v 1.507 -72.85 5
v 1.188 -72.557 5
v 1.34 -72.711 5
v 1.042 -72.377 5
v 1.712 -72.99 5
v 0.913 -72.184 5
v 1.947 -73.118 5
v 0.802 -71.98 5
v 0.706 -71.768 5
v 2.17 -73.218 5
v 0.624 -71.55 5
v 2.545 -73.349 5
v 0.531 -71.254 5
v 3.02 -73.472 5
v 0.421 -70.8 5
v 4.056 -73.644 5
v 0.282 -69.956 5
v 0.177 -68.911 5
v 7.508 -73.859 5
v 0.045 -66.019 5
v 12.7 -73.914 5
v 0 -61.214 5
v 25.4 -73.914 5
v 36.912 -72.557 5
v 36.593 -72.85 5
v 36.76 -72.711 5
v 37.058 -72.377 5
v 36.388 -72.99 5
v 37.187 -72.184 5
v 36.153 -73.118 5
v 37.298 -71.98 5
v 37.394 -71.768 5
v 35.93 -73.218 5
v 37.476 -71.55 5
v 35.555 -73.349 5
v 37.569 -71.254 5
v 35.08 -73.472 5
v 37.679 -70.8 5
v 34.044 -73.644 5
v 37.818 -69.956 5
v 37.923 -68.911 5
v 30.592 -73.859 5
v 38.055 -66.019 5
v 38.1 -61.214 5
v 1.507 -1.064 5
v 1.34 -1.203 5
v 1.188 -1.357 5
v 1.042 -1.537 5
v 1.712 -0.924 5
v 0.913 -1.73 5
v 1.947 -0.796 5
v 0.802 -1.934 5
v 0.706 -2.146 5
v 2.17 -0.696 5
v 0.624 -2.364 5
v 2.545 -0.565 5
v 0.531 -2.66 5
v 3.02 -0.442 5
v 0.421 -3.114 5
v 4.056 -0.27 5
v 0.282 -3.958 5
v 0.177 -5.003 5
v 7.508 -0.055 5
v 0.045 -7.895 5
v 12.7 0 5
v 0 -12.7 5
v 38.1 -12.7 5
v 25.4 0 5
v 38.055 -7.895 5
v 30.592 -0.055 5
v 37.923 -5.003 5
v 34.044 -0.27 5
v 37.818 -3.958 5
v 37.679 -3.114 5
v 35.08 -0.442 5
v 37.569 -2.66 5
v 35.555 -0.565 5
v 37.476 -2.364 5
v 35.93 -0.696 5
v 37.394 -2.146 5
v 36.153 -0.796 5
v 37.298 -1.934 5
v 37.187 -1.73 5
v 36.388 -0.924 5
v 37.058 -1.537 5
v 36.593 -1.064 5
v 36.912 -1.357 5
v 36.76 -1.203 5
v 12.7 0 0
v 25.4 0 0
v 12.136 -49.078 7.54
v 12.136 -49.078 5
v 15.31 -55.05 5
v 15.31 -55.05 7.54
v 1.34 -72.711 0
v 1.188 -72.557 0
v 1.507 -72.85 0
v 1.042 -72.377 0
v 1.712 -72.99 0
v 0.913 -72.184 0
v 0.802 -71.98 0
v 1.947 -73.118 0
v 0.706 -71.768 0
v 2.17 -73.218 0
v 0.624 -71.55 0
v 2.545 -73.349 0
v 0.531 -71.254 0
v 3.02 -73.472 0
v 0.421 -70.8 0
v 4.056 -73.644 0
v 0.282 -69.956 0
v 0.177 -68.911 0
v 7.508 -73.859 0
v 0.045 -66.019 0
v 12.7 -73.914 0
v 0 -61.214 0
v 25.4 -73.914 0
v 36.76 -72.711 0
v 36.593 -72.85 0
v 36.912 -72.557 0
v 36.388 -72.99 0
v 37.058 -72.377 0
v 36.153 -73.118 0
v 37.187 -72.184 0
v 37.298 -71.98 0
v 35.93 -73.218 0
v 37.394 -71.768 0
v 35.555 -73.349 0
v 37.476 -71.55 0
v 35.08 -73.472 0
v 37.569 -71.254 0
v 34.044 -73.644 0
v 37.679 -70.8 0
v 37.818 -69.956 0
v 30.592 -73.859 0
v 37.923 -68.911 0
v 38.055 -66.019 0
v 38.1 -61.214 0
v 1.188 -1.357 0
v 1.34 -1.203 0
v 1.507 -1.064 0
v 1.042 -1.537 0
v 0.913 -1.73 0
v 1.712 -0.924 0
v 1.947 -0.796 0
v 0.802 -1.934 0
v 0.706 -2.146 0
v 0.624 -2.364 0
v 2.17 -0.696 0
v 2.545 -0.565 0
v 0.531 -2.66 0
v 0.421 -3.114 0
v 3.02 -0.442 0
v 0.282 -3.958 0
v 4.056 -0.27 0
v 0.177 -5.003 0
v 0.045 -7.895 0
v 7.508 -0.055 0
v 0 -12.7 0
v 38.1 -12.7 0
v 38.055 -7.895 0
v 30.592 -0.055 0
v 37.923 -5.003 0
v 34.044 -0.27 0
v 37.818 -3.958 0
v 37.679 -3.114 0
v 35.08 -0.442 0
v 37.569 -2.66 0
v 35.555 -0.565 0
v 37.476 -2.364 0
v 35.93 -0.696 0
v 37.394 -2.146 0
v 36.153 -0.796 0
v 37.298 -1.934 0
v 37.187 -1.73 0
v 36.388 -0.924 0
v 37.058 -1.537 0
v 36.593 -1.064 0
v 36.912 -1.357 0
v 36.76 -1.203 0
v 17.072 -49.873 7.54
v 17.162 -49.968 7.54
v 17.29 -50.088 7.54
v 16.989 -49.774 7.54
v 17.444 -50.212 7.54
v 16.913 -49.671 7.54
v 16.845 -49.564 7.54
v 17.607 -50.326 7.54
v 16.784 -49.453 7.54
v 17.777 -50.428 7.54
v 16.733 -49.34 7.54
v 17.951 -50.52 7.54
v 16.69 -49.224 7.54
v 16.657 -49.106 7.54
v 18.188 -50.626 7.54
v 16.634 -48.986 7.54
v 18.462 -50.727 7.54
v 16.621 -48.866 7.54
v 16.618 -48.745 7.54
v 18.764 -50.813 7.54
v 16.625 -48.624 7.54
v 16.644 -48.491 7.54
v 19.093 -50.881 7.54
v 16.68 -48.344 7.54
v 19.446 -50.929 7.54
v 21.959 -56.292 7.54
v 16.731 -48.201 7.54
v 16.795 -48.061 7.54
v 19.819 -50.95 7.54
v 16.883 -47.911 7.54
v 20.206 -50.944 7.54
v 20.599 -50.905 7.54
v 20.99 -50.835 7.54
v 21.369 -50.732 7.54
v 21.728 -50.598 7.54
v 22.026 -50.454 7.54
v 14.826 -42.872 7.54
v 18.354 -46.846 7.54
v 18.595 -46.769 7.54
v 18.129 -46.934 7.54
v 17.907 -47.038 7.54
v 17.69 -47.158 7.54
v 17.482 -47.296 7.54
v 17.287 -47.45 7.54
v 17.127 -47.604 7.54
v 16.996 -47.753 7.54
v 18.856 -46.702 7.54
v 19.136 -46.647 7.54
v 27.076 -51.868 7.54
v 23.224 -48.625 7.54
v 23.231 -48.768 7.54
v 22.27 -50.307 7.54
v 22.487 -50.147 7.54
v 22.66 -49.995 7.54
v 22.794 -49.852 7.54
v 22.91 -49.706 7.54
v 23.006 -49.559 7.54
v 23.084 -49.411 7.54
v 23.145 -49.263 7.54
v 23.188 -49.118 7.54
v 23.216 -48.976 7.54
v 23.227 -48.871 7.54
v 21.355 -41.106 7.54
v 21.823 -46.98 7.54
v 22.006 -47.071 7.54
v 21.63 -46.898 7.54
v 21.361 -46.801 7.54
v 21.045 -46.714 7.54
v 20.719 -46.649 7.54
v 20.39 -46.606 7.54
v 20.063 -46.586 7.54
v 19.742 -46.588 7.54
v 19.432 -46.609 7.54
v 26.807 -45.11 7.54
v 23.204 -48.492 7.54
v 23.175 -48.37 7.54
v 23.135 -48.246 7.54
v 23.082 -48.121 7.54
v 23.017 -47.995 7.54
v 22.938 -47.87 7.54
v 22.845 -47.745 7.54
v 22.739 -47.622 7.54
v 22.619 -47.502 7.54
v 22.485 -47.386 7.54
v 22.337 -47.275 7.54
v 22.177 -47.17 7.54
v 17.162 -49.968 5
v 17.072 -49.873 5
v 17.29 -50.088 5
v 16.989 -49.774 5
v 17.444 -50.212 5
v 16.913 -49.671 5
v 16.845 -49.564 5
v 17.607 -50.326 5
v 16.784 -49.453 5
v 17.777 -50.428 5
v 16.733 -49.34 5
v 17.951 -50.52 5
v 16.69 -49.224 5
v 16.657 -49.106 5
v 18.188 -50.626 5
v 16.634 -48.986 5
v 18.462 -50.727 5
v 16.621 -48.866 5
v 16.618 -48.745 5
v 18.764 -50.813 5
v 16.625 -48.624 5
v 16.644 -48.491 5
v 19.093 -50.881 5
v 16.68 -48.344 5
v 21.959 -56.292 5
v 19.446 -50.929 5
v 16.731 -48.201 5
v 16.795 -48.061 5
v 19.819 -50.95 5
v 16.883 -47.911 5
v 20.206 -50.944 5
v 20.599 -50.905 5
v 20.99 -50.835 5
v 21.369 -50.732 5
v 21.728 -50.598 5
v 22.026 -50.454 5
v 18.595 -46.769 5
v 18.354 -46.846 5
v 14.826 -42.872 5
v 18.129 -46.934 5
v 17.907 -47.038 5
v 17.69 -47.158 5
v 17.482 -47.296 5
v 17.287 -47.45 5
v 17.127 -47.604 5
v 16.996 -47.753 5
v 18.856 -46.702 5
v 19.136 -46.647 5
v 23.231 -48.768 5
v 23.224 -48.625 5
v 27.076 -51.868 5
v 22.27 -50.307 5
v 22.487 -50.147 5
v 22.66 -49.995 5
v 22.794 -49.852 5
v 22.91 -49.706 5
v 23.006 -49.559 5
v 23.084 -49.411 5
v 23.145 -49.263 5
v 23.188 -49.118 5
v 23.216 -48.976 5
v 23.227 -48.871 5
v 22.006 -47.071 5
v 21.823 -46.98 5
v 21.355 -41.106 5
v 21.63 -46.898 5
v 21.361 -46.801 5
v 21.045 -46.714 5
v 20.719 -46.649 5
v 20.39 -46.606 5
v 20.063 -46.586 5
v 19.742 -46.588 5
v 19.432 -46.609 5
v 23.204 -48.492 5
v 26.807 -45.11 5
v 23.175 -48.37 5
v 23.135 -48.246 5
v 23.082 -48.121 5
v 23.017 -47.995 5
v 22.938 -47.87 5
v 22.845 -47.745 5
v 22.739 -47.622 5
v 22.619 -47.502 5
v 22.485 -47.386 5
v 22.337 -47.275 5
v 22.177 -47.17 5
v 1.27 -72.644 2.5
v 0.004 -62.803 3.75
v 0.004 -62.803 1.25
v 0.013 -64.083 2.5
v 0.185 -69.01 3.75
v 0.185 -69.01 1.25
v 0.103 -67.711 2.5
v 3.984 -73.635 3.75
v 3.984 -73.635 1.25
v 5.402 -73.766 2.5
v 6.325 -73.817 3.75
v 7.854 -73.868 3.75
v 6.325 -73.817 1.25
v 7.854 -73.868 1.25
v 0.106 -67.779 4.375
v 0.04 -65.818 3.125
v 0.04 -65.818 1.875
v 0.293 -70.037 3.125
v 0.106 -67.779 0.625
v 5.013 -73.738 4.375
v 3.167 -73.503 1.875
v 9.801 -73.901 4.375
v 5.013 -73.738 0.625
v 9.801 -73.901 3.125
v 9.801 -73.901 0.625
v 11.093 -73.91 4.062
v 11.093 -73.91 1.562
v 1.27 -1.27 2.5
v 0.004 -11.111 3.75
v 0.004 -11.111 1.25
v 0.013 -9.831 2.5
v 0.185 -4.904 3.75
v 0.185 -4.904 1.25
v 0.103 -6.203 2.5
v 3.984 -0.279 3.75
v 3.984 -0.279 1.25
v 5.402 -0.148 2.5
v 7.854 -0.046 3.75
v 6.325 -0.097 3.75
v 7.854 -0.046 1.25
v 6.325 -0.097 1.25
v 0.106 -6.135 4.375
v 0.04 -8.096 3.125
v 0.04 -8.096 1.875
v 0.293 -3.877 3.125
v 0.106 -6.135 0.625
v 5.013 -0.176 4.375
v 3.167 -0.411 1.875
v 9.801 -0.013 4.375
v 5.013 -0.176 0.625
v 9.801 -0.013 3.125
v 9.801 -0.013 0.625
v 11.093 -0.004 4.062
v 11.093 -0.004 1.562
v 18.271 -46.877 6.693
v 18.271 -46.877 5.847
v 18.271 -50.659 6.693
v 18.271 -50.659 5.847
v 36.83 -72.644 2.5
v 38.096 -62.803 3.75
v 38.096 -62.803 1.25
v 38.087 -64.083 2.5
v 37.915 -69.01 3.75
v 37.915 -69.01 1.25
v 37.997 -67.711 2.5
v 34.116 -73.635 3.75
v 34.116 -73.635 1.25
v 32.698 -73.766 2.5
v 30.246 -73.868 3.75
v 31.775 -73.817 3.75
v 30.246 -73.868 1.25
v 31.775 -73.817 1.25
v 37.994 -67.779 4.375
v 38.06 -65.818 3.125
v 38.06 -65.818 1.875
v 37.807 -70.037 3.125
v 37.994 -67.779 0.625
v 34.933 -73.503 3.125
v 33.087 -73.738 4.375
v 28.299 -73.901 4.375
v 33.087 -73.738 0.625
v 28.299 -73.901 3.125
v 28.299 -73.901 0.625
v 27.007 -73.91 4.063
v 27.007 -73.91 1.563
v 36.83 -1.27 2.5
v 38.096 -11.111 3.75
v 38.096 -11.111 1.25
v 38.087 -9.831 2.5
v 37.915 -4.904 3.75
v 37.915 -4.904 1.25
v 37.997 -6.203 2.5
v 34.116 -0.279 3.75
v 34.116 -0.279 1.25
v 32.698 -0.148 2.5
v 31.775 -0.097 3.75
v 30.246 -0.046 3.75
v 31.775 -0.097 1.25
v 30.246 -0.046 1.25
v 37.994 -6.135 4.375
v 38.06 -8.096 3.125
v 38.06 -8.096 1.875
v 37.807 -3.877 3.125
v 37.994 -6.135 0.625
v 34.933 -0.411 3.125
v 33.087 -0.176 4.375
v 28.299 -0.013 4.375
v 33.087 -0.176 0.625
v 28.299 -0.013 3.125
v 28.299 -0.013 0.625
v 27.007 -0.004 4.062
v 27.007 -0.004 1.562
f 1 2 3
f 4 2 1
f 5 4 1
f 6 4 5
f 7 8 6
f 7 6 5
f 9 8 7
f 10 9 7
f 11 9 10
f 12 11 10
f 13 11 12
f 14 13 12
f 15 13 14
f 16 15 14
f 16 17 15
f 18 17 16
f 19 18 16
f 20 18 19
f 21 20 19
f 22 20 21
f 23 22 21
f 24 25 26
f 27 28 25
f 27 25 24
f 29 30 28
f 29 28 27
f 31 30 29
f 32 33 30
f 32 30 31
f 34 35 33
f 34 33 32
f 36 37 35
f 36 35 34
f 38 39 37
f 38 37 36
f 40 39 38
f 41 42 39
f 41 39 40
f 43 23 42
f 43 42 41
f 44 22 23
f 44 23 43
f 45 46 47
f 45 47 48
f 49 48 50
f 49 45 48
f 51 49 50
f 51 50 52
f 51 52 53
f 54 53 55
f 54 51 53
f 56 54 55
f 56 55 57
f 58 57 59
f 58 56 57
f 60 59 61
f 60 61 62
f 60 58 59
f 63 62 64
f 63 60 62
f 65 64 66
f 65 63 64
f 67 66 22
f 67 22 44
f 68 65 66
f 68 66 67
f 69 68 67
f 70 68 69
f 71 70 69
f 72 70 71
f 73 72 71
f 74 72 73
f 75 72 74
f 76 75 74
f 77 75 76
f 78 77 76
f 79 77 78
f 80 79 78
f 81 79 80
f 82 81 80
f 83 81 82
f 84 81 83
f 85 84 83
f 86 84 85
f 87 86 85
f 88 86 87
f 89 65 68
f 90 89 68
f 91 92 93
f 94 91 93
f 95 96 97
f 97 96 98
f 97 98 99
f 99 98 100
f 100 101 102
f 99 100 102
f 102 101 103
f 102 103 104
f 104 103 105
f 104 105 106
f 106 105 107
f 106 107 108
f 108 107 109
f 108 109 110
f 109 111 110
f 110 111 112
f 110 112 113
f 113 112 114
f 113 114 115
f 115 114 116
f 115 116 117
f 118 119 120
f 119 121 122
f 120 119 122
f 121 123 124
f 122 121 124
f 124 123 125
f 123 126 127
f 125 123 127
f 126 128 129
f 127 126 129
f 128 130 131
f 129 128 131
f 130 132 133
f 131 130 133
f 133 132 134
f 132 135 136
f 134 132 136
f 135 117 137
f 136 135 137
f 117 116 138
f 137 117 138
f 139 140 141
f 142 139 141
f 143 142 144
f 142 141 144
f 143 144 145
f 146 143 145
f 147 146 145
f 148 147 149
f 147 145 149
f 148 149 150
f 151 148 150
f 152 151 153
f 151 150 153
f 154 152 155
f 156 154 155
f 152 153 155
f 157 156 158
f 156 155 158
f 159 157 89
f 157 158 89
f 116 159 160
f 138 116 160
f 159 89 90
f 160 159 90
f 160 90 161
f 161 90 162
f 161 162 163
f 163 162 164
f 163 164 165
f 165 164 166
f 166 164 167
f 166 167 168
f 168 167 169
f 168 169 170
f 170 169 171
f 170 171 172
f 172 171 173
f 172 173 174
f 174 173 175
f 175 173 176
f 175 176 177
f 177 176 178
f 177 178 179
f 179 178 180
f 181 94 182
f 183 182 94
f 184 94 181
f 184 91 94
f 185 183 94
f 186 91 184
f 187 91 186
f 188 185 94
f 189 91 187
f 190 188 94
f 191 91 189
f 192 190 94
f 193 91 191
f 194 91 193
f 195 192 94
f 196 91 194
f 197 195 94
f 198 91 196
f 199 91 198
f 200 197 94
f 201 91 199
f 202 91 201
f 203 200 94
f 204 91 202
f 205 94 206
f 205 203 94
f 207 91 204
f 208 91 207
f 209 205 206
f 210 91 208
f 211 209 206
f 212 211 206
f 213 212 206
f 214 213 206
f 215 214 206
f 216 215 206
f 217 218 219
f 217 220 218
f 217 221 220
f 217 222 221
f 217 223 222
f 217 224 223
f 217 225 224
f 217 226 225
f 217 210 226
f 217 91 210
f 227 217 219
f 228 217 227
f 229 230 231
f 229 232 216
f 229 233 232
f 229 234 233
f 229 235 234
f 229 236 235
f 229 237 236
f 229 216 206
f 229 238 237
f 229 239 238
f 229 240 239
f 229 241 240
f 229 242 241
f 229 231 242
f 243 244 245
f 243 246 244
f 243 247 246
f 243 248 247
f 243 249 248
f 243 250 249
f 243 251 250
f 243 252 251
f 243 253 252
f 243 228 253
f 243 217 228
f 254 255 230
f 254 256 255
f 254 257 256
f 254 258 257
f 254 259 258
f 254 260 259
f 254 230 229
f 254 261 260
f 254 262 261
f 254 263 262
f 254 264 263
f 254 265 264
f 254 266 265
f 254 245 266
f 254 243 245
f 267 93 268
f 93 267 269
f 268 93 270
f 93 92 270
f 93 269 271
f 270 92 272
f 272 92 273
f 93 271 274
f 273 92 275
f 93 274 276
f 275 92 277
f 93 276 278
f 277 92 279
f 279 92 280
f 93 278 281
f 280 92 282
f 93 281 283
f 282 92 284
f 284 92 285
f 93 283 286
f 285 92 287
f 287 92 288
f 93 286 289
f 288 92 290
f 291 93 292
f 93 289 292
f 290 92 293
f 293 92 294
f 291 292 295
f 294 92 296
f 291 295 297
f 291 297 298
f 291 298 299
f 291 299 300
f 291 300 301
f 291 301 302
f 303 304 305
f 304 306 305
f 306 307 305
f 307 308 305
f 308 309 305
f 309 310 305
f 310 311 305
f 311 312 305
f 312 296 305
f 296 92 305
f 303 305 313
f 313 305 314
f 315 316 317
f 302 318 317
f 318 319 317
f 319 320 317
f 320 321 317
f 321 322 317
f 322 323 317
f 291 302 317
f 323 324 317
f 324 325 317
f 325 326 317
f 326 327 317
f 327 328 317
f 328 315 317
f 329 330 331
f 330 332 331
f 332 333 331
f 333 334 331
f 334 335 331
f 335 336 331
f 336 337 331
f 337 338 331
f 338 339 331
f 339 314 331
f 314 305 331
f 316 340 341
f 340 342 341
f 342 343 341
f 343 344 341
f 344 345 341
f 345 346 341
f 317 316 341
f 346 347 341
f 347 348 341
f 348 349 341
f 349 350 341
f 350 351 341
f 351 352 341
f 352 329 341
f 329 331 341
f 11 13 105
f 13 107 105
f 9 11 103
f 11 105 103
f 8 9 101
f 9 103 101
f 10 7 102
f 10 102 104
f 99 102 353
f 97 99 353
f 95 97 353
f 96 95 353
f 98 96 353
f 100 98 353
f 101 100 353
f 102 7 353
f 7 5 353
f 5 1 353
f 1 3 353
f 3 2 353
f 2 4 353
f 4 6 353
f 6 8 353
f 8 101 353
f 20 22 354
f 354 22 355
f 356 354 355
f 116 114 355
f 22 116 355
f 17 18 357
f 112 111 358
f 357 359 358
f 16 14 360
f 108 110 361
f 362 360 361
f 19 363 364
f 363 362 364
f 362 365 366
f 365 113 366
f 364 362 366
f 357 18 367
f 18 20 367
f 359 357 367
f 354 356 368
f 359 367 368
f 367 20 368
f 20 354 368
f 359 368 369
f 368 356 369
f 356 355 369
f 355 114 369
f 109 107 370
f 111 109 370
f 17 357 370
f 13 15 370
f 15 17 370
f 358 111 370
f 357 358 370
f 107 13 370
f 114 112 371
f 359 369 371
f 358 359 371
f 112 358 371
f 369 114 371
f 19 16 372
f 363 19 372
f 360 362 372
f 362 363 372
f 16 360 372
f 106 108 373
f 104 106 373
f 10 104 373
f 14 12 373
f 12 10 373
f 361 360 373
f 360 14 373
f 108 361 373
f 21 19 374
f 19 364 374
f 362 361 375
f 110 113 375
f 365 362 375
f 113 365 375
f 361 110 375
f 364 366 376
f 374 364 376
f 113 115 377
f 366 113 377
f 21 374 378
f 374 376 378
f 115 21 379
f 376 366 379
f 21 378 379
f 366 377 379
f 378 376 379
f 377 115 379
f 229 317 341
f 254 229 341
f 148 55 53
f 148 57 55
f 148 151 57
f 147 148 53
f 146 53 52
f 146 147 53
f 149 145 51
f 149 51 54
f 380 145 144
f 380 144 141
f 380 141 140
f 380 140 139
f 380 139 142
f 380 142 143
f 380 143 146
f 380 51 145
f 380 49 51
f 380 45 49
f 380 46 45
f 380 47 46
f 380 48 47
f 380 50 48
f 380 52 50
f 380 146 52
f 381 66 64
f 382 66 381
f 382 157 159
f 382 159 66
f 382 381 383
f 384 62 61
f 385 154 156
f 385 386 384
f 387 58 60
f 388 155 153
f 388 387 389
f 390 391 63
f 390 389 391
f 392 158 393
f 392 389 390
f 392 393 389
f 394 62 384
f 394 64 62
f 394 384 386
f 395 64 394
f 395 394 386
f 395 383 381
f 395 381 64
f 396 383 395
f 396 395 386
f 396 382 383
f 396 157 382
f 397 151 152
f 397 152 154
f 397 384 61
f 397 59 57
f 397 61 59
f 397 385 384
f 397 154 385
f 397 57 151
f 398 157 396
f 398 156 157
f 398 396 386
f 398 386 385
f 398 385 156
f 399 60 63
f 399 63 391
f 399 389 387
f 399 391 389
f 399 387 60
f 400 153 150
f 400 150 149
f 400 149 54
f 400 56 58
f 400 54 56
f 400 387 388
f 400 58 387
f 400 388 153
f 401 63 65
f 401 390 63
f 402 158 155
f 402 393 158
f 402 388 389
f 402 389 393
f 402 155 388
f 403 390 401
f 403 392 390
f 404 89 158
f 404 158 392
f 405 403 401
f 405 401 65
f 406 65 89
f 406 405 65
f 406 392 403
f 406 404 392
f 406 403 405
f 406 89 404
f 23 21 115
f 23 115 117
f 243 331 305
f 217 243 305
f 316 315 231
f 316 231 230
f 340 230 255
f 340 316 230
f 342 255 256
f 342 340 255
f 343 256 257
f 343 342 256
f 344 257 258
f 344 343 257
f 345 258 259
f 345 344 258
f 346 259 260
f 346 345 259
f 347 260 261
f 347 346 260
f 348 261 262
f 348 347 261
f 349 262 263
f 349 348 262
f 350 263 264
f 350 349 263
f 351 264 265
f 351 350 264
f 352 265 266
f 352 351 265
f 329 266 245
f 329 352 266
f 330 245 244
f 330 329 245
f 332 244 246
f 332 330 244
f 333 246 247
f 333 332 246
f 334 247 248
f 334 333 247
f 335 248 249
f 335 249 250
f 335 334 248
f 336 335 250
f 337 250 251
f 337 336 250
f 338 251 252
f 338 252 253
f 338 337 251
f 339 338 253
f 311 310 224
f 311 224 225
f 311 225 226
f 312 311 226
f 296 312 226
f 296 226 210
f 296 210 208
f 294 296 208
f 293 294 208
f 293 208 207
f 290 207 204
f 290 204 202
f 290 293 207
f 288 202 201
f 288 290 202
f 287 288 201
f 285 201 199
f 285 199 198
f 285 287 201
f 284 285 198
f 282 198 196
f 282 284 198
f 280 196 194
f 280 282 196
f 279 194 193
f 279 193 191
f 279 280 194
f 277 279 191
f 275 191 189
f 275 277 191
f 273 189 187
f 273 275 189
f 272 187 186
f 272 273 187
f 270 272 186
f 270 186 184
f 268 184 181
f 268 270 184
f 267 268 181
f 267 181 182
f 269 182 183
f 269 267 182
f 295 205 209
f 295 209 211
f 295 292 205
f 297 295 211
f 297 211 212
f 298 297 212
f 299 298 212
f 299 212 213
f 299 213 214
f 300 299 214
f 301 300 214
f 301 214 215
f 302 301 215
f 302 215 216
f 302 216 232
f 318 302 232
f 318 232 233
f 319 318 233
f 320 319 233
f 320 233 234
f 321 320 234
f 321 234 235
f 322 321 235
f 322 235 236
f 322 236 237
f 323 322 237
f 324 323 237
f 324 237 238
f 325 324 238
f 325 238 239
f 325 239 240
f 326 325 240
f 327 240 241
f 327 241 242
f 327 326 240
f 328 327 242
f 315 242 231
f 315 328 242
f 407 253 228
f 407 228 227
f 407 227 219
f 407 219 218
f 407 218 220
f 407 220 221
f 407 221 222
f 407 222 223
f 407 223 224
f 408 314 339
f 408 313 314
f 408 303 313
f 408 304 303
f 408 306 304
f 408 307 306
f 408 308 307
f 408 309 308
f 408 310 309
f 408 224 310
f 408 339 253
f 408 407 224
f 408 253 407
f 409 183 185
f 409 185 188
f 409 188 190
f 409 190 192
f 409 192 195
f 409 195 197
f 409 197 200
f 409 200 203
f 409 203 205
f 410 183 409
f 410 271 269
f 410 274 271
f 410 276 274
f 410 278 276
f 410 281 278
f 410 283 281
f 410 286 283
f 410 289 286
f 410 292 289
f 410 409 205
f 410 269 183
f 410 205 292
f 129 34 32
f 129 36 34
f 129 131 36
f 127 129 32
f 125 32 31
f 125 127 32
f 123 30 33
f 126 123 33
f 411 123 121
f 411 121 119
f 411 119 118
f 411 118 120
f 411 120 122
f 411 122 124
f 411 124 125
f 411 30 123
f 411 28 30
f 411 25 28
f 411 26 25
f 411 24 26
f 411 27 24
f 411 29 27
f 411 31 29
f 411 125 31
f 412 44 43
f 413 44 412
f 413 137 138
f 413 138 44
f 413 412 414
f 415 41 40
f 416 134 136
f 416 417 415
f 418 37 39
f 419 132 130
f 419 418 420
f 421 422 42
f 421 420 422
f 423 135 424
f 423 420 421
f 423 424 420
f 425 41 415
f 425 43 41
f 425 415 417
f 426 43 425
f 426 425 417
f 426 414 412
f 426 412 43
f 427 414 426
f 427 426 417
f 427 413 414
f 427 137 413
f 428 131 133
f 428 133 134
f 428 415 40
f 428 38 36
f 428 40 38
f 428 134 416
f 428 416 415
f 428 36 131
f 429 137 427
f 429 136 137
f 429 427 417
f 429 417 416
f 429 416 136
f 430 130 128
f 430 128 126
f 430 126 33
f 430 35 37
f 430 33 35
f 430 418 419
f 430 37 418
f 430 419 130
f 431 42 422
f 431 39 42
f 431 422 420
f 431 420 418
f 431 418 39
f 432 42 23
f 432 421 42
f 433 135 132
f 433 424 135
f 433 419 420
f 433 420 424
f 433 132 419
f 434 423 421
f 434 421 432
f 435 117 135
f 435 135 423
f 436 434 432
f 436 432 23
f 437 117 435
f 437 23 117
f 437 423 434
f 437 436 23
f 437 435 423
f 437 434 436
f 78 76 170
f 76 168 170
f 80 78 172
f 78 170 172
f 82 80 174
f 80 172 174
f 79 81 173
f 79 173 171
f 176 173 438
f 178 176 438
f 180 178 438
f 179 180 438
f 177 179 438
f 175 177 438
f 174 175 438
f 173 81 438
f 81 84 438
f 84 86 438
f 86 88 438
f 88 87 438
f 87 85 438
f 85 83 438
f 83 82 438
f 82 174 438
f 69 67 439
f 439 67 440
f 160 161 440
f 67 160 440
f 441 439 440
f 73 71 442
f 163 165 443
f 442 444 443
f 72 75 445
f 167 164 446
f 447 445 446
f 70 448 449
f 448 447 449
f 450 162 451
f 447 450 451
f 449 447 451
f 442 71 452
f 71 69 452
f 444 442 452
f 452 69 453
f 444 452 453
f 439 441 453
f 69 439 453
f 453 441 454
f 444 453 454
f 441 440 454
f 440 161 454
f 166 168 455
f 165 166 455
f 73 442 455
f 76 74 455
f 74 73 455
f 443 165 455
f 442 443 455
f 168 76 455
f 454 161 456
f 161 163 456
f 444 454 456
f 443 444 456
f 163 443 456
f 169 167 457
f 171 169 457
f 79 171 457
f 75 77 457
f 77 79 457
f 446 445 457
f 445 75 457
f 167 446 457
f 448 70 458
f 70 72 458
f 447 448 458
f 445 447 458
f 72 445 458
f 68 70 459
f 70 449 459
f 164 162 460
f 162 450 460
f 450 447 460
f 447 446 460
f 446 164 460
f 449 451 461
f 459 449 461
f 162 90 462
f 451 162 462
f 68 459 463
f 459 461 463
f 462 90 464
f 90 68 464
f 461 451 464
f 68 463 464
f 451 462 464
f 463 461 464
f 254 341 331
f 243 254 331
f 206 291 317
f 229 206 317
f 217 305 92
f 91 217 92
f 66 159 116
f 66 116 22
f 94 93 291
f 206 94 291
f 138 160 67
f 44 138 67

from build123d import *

# Parameters (mm, degrees)
F0_W        = 38.1
F0_H        = 5
F1_DEPTH    = 73.914
F2_T1_DEPTH = 68.5
F5_DEPTH    = 2.54


# Not quite as in the source:
# - a fillet or chamfer that OpenCascade refuses, or shapes differently, is made with other operations: its cross-section is extruded or revolved along the edge and cut away or added


with BuildPart() as f1:
    # F0 (on Front) → F1 (new body)
    with BuildSketch(Plane.XZ):
        with Locations((19.05, 2.5)):
            Rectangle(F0_W, F0_H)
    extrude(amount=F1_DEPTH)

    # F2: fillet of radius 12.7 on 4 edges, made by hand

    # F2_s2 → F2_t1 (cut)
    with BuildSketch(Plane.XY.offset(-31.75)):
        with BuildLine():
            add(Edge.make_bspline(
                [(38.1, -61.214), (38.1, -73.914), (25.4, -73.914)],
                knots=[0, 0, 0, 1, 1, 1], degree=2, weights=[1, 4, 1]))
            Line((25.4, -73.914), (38.1, -73.914))
            Line((38.1, -73.914), (38.1, -61.214))
        make_face()
        with BuildLine():
            add(Edge.make_bspline(
                [(0, -12.7), (0, 0), (12.7, 0)],
                knots=[0, 0, 0, 1, 1, 1], degree=2, weights=[1, 4, 1]))
            Line((12.7, 0), (0, 0))
            Line((0, 0), (0, -12.7))
        make_face()
        with BuildLine():
            add(Edge.make_bspline(
                [(38.1, -12.7), (38.1, 0), (25.4, 0)],
                knots=[0, 0, 0, 1, 1, 1], degree=2, weights=[1, 4, 1]))
            Line((25.4, 0), (38.1, 0))
            Line((38.1, 0), (38.1, -12.7))
        make_face()
        with BuildLine():
            add(Edge.make_bspline(
                [(0, -61.214), (0, -73.914), (12.7, -73.914)],
                knots=[0, 0, 0, 1, 1, 1], degree=2, weights=[1, 4, 1]))
            Line((12.7, -73.914), (0, -73.914))
            Line((0, -73.914), (0, -61.214))
        make_face()
    extrude(amount=F2_T1_DEPTH, mode=Mode.SUBTRACT)


with BuildPart() as f5:
    # F4 (on face) → F5 (new body)
    with BuildSketch(Plane.XY.offset(5)):
        Polygon((21.9590889072, -56.2922066174), (27.0755512858, -51.8682369866), (26.8068146657, -45.1097256716), (21.3552432029, -41.1059695411), (14.8259814009, -42.8718786231), (12.1356965691, -49.0776873608), (15.3102280577, -55.0502951994), align=None)
        with BuildLine():
            add(Edge.make_bspline(
                [(23.230788256, -48.768), (23.230788256, -44.9860916248), (18.2707353197, -46.8770458124), (13.3106823833, -48.768), (18.2707353197, -50.6589541876), (23.230788256, -52.5499083752), (23.230788256, -48.768)],
                knots=[0, 0, 0, 2.0943951024, 2.0943951024, 4.1887902048, 4.1887902048, 6.2831853072, 6.2831853072, 6.2831853072], degree=2, weights=[1, 0.5, 1, 0.5, 1, 0.5, 1]))
        make_face(mode=Mode.SUBTRACT)
    extrude(amount=F5_DEPTH)


solid = Compound([f1.part, f5.part])
